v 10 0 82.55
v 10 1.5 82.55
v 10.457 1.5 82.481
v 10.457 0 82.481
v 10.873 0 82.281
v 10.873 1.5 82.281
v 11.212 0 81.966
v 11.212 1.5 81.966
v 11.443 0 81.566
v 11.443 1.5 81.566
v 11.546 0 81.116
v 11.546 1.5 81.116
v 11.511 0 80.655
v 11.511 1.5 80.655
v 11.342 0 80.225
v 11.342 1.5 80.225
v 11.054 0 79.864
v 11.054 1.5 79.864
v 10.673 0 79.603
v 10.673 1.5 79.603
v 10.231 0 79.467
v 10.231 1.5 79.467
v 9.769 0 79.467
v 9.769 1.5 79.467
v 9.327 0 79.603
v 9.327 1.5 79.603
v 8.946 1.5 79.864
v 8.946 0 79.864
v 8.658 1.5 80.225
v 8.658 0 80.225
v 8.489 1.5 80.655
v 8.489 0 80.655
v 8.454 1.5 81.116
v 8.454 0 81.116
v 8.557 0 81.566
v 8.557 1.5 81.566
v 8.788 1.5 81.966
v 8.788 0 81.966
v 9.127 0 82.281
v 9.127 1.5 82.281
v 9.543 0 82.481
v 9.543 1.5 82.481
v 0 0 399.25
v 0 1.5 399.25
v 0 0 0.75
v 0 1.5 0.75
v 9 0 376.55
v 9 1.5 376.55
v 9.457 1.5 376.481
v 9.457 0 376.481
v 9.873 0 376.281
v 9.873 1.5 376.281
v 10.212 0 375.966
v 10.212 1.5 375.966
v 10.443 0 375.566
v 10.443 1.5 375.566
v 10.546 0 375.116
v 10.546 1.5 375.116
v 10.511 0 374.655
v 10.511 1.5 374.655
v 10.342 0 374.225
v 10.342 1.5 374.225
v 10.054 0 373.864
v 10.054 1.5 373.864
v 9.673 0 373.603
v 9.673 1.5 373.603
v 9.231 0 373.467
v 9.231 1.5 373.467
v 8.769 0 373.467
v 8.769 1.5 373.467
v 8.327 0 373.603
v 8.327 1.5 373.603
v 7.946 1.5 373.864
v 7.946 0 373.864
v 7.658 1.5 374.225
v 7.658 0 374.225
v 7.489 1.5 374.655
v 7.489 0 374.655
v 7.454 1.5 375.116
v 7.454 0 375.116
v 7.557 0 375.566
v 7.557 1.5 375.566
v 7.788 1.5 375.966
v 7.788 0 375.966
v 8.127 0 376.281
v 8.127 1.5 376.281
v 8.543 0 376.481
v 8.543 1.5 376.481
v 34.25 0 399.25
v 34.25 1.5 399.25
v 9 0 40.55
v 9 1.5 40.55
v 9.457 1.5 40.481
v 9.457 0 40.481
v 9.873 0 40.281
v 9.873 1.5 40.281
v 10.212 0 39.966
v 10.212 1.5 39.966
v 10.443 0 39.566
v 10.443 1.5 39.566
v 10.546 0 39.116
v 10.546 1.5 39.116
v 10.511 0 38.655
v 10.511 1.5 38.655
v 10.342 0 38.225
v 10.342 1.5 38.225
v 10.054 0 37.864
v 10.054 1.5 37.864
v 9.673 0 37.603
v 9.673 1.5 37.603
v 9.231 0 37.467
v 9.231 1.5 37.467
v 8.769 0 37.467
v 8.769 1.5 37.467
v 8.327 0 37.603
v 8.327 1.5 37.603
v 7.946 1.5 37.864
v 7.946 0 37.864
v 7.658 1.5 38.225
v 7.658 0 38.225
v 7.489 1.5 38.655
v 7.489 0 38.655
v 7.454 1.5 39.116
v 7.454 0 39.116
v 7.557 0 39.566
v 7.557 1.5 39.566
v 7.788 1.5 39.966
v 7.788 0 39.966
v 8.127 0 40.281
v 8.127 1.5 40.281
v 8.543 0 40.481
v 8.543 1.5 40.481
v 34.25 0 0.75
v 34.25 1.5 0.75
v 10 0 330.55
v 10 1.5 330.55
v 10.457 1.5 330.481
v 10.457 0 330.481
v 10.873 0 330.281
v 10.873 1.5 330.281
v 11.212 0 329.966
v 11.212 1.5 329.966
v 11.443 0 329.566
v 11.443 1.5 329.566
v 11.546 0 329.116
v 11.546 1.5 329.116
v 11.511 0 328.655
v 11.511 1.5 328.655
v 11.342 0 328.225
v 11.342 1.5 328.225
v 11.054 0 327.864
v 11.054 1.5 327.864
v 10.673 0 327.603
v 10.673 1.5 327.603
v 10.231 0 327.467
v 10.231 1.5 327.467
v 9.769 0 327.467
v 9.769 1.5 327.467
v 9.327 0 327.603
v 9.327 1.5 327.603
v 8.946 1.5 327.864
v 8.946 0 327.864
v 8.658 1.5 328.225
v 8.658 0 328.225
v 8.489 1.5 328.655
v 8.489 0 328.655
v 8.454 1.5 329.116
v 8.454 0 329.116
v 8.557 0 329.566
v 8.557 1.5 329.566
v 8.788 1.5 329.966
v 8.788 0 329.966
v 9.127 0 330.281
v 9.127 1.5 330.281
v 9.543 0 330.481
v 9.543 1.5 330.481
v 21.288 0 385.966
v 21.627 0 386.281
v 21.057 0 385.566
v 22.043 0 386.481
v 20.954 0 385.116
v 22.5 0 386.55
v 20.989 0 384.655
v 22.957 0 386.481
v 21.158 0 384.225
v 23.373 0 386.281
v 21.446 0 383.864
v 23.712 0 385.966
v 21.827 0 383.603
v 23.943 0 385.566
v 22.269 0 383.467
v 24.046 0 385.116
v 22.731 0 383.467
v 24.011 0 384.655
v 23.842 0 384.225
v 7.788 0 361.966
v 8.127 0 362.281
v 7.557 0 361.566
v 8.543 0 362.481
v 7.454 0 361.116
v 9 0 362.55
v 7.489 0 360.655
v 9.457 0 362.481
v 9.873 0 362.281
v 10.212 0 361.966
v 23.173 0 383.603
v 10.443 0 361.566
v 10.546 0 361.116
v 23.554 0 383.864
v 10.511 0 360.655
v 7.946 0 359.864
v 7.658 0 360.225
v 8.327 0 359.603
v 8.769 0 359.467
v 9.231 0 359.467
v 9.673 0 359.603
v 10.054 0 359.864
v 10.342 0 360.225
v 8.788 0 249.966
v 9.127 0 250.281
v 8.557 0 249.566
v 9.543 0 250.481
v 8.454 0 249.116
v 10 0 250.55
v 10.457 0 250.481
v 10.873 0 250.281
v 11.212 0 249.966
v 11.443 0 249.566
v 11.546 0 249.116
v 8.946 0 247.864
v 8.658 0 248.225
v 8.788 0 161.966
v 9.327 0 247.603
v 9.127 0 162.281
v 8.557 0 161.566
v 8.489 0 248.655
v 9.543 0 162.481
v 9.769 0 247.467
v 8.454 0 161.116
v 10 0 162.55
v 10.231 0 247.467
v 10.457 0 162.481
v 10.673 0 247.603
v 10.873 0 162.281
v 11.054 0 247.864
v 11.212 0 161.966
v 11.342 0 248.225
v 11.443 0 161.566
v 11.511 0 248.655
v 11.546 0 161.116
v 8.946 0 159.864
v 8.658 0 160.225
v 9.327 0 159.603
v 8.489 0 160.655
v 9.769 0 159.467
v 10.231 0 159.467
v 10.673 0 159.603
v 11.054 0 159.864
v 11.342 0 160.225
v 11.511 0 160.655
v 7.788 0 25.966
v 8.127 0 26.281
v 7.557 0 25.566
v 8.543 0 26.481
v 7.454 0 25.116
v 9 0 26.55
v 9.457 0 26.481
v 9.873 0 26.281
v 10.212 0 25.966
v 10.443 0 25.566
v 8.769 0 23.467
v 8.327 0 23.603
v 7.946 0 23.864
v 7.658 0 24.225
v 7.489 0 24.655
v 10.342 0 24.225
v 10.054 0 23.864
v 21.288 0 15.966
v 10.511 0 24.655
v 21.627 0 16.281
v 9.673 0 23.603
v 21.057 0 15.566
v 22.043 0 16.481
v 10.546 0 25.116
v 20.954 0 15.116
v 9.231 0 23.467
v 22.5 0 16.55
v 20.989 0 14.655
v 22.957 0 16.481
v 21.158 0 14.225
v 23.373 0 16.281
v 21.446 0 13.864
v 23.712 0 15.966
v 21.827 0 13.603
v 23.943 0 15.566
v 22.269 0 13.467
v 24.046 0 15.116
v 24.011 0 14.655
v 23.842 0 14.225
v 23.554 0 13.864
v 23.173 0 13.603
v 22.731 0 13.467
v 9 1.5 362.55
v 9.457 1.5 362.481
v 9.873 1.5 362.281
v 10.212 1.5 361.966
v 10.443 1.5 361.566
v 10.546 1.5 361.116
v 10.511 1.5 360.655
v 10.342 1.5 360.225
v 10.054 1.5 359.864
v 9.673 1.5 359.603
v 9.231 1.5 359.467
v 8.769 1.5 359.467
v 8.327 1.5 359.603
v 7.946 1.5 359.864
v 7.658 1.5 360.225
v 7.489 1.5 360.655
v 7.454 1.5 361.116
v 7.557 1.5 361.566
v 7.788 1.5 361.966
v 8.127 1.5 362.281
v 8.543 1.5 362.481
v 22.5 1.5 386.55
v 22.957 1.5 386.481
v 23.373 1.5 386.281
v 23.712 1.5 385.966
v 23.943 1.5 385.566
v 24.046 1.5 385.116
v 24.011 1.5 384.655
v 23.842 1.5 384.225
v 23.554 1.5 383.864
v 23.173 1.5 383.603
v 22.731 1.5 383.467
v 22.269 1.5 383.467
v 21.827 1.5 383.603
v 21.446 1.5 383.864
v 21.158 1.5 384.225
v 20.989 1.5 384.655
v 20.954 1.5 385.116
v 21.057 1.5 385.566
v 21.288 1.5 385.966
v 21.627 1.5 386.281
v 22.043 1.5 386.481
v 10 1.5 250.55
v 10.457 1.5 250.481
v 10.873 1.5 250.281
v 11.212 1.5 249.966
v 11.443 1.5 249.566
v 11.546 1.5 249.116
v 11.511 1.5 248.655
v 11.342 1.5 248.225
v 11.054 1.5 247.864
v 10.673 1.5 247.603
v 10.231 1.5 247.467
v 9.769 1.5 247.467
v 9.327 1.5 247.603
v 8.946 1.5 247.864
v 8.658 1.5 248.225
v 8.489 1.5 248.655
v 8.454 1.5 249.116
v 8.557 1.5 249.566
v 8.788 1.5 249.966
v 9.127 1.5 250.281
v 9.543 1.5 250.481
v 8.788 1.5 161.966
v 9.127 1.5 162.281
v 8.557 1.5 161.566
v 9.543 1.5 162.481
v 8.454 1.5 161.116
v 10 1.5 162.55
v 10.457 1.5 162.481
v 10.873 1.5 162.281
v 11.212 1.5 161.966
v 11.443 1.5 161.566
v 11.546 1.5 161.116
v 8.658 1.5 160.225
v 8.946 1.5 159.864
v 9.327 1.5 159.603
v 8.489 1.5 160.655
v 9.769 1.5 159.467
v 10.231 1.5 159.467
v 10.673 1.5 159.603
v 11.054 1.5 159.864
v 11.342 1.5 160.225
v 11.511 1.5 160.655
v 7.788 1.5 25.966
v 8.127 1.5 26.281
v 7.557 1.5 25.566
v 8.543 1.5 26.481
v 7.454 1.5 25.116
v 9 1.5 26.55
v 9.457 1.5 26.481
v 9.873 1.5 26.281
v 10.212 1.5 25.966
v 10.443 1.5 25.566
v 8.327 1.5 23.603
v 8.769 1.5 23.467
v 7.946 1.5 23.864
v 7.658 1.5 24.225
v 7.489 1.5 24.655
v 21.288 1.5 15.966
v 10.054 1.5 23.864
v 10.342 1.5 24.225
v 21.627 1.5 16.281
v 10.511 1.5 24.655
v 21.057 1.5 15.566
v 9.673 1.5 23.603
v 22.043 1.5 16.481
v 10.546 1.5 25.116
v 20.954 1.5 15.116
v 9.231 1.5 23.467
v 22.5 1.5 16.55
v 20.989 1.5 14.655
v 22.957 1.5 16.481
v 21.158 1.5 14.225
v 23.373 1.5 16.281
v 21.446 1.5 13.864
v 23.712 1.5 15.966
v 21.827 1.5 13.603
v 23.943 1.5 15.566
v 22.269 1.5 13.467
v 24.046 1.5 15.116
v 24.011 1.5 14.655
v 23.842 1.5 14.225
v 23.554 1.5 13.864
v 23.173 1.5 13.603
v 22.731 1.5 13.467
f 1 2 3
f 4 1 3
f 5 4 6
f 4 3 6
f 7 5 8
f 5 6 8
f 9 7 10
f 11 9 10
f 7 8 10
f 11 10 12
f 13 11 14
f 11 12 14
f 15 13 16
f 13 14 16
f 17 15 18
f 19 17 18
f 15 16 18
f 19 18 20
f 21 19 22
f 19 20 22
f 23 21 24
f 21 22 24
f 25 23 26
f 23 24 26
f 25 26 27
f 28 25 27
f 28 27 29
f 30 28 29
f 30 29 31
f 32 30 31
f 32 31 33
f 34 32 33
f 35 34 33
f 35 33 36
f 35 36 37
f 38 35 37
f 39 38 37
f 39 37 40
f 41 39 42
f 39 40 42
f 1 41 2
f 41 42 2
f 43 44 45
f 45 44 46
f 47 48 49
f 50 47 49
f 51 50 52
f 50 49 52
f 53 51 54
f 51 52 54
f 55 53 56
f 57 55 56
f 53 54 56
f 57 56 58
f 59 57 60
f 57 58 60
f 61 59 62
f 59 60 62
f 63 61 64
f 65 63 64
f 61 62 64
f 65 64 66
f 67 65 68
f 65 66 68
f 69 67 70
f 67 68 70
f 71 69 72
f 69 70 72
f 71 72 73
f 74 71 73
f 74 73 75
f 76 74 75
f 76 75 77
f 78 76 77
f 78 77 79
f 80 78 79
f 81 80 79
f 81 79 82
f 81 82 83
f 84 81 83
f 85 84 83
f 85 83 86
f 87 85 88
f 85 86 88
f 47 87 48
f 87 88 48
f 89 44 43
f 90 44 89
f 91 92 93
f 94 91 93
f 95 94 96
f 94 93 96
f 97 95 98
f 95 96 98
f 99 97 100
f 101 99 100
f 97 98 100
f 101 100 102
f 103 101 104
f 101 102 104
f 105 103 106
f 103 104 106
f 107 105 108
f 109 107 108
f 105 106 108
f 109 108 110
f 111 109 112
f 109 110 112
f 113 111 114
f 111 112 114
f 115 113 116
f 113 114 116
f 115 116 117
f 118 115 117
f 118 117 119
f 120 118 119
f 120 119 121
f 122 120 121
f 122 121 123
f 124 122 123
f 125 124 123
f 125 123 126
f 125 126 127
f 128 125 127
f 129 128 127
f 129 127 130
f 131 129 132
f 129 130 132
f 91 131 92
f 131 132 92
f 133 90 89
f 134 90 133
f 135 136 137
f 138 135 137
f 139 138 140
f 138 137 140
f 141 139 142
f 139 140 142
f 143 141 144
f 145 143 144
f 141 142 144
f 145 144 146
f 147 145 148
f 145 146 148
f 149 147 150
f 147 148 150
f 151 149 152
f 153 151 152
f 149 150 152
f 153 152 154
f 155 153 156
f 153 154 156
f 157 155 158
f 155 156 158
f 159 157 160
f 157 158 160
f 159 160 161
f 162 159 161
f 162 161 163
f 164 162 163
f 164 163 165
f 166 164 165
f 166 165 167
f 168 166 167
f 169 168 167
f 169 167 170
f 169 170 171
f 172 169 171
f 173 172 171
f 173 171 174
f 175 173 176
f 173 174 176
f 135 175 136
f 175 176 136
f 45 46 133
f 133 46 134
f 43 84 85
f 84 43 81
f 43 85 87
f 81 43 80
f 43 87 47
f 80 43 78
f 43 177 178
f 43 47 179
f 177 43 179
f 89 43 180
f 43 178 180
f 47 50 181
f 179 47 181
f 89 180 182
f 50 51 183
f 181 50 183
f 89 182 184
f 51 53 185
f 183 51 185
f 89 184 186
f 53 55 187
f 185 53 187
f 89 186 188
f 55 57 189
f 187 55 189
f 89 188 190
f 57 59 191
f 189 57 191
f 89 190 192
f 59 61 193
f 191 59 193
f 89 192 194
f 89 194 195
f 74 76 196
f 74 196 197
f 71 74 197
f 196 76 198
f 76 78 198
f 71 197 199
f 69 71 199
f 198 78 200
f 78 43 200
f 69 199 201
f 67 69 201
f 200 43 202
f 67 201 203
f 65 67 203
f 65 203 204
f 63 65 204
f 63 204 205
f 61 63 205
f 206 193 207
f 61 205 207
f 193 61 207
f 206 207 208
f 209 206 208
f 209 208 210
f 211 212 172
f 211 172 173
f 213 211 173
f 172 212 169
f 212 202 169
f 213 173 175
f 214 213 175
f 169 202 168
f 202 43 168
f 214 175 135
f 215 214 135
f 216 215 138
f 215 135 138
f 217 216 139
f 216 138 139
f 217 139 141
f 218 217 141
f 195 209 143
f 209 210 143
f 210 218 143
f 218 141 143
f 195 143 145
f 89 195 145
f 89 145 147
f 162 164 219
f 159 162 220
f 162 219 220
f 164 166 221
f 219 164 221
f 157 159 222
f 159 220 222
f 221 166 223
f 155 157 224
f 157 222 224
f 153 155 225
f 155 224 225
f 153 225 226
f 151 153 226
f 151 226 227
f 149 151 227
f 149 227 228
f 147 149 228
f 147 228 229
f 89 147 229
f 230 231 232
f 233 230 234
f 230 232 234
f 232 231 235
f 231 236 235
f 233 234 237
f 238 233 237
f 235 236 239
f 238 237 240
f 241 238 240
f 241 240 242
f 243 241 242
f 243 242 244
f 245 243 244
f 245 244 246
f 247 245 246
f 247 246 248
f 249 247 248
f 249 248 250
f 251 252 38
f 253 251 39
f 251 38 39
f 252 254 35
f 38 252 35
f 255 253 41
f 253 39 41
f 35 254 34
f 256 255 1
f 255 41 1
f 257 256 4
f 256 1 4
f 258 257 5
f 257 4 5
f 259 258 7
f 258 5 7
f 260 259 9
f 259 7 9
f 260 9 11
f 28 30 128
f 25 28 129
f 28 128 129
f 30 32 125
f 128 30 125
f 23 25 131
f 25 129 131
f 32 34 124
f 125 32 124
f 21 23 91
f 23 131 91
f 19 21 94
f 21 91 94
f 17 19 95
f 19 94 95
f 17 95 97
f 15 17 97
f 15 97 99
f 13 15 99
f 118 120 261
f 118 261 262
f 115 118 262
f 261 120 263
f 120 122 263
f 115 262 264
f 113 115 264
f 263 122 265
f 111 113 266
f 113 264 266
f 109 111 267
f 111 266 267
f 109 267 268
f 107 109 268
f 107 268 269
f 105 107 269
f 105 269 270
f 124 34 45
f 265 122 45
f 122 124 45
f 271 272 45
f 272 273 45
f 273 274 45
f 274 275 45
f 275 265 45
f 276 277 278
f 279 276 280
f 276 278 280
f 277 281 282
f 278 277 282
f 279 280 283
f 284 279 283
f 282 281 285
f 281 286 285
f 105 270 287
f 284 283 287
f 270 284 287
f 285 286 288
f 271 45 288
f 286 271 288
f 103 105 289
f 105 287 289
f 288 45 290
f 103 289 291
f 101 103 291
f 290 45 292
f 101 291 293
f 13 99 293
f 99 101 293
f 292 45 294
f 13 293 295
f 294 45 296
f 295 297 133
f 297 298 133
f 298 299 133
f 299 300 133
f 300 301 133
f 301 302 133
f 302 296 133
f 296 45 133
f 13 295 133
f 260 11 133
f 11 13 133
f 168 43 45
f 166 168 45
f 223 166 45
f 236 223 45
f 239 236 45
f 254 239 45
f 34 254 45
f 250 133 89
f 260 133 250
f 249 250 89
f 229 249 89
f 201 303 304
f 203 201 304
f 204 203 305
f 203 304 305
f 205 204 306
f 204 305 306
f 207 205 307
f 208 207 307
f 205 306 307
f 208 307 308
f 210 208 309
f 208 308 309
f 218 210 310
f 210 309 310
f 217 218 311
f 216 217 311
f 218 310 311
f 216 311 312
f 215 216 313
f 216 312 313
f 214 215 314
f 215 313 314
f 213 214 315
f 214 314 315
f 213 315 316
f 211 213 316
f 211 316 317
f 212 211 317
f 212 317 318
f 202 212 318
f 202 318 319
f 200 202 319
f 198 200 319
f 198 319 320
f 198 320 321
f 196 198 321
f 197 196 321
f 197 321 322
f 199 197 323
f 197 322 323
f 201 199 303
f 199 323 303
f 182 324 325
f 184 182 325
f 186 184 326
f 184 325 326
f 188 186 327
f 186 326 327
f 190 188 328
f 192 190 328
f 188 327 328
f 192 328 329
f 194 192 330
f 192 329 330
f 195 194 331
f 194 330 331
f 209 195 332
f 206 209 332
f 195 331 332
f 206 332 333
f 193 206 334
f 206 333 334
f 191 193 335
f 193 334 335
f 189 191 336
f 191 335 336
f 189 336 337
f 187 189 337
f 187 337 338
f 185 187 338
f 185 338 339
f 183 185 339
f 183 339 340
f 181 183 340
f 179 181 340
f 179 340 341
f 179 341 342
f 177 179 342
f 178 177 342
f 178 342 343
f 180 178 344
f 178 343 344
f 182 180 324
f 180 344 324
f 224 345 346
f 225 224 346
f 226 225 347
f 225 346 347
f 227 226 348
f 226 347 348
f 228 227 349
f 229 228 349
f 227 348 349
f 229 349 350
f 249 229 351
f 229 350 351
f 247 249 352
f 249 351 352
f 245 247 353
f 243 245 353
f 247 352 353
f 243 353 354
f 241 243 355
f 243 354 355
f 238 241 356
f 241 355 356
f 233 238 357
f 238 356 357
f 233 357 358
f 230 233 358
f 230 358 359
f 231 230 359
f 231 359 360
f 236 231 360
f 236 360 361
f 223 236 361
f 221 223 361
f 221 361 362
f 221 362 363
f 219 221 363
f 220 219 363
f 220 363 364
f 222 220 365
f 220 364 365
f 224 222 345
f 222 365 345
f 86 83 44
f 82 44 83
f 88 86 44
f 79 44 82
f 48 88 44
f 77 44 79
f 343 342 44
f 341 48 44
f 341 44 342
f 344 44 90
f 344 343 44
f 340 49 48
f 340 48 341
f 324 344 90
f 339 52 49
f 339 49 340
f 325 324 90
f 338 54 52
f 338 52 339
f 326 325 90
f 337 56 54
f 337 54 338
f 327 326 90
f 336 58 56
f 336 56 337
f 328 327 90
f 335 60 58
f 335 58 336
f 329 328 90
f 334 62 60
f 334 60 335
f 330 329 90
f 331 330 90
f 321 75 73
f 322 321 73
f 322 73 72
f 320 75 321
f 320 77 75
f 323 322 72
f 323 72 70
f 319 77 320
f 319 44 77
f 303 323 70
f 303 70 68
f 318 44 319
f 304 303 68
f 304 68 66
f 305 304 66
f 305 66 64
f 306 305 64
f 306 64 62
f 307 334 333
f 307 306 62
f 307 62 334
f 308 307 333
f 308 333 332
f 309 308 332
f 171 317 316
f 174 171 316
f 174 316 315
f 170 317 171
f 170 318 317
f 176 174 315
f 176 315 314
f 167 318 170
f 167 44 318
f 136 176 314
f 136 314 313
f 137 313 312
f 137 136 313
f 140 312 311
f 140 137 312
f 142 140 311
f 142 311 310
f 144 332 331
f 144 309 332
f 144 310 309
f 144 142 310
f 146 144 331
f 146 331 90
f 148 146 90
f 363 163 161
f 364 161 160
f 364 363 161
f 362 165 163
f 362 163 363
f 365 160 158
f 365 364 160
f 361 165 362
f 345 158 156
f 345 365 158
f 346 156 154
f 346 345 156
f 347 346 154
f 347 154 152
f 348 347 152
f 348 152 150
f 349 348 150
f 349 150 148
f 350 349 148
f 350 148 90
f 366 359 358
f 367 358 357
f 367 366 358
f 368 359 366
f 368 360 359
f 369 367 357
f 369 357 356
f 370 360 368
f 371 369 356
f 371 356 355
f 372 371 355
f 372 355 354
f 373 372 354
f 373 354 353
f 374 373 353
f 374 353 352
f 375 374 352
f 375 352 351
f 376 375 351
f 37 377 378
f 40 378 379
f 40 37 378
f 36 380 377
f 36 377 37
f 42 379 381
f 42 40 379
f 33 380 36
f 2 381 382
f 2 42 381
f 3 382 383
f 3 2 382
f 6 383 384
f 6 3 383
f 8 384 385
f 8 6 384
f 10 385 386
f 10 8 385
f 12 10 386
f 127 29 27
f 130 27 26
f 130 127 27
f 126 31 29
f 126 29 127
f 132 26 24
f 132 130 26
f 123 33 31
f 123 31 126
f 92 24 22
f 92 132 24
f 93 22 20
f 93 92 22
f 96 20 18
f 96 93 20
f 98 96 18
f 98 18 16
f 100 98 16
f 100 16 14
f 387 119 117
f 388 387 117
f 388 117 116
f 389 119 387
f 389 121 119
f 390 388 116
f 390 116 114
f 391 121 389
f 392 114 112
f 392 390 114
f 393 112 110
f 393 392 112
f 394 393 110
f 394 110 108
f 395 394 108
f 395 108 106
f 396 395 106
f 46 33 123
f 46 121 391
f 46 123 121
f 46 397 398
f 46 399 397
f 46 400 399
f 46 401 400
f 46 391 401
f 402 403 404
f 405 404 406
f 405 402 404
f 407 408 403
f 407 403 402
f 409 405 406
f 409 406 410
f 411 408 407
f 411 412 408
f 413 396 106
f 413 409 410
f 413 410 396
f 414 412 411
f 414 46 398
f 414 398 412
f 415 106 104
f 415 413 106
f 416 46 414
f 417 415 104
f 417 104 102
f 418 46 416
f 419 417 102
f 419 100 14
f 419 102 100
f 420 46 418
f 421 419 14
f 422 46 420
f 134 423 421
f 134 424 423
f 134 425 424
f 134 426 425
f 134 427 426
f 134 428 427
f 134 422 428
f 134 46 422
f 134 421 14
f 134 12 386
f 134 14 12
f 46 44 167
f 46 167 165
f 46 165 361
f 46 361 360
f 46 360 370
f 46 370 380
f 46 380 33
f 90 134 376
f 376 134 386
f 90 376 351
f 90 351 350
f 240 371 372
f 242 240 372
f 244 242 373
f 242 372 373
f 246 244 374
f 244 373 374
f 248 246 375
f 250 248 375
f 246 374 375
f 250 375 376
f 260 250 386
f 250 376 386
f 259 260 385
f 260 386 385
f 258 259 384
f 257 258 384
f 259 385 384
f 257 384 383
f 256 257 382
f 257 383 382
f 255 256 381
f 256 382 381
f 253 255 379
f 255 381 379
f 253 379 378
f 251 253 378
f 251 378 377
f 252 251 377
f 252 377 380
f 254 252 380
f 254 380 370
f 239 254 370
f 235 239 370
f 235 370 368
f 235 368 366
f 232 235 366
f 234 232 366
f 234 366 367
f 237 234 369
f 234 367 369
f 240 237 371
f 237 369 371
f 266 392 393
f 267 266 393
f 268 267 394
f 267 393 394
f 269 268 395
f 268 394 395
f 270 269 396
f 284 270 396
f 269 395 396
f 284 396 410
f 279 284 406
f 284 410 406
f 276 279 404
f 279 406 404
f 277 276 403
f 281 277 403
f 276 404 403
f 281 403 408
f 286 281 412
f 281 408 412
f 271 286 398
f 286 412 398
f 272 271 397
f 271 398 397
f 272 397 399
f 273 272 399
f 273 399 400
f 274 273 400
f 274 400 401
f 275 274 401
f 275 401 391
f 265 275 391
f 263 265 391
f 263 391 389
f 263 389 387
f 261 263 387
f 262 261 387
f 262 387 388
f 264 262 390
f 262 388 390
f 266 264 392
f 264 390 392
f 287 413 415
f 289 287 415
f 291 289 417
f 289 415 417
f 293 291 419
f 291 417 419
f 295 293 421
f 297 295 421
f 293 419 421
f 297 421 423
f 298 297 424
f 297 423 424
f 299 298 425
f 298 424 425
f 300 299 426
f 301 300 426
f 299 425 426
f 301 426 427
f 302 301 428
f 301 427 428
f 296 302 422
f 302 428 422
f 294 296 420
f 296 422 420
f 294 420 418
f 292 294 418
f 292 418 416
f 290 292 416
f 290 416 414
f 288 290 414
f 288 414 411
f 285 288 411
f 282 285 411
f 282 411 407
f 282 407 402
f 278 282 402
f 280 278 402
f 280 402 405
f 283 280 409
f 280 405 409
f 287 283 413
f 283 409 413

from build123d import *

# Parameters (mm, degrees)
CROQUIS1_W              = 35
CROQUIS1_H              = 400
SALIENTE_EXTRUIR1_DEPTH = 1.5
CROQUIS2_R              = 1.55
CORTAR_EXTRUIR1_DEPTH   = 1.5
CROQUIS3_R              = 1.55
CORTAR_EXTRUIR2_DEPTH   = 1.5
CROQUIS5_R              = 1.55
CORTAR_EXTRUIR3_DEPTH   = 1.5
CROQUIS6_OUTSIDE_W      = 117.306
CROQUIS6_OUTSIDE_H      = 482.306
CROQUIS6_OUTSIDE_W_2    = 33.5
CROQUIS6_OUTSIDE_H_2    = 398.5
CORTAR_EXTRUIR4_DEPTH   = 1.5
CROQUIS7_W              = 0.75
CROQUIS7_H              = 398.5
SALIENTE_EXTRUIR2_DEPTH = 1.5


with BuildPart() as part:
    # Croquis1 → Saliente-Extruir1 (new body)
    with BuildSketch(Plane(origin=(0, 0, 0), x_dir=(1, 0, 0), z_dir=(0, 1, 0))):
        with Locations((17.5, -200)):
            Rectangle(CROQUIS1_W, CROQUIS1_H)
    extrude(amount=SALIENTE_EXTRUIR1_DEPTH)

    # Croquis2 → Cortar-Extruir1 (cut)
    with BuildSketch(Plane(origin=(0, 1.5, 0), x_dir=(1, 0, 0), z_dir=(0, 1, 0))):
        with Locations(Location((22.5, -15, 0), (0, 0, 270))):
            Circle(CROQUIS2_R)
        with Locations(Location((22.5, -385, 0), (0, 0, 270))):
            Circle(CROQUIS2_R)
    extrude(amount=-CORTAR_EXTRUIR1_DEPTH, mode=Mode.SUBTRACT)

    # Croquis3 → Cortar-Extruir2 (cut)
    with BuildSketch(Plane(origin=(0, 1.5, 0), x_dir=(1, 0, 0), z_dir=(0, 1, 0))):
        with Locations(Location((9, -25, 0), (0, 0, 270))):
            Circle(CROQUIS3_R)
        with Locations(Location((9, -39, 0), (0, 0, 270))):
            Circle(CROQUIS3_R)
        with Locations(Location((9, -375, 0), (0, 0, 270))):
            Circle(CROQUIS3_R)
        with Locations(Location((9, -361, 0), (0, 0, 270))):
            Circle(CROQUIS3_R)
    extrude(amount=-CORTAR_EXTRUIR2_DEPTH, mode=Mode.SUBTRACT)

    # Croquis5 → Cortar-Extruir3 (cut)
    with BuildSketch(Plane(origin=(0, 1.5, 0), x_dir=(1, 0, 0), z_dir=(0, 1, 0))):
        with Locations(Location((10, -81, 0), (0, 0, 270))):
            Circle(CROQUIS5_R)
        with Locations(Location((10, -161, 0), (0, 0, 270))):
            Circle(CROQUIS5_R)
        with Locations(Location((10, -249, 0), (0, 0, 270))):
            Circle(CROQUIS5_R)
        with Locations(Location((10, -329, 0), (0, 0, 270))):
            Circle(CROQUIS5_R)
    extrude(amount=-CORTAR_EXTRUIR3_DEPTH, mode=Mode.SUBTRACT)

    # Croquis6 outside → Cortar-Extruir4 (cut)
    with BuildSketch(Plane(origin=(0, 1.5, 0), x_dir=(1, 0, 0), z_dir=(0, 1, 0))):
        with Locations((17.5, -200)):
            Rectangle(CROQUIS6_OUTSIDE_W, CROQUIS6_OUTSIDE_H)
        with Locations((17.5, -200)):
            Rectangle(CROQUIS6_OUTSIDE_W_2, CROQUIS6_OUTSIDE_H_2, mode=Mode.SUBTRACT)
    extrude(amount=-CORTAR_EXTRUIR4_DEPTH, mode=Mode.SUBTRACT)

    # Croquis7 → Saliente-Extruir2 (add)
    with BuildSketch(Plane(origin=(0, 1.5, 0), x_dir=(1, 0, 0), z_dir=(0, 1, 0))):
        with Locations((0.375, -200)):
            Rectangle(CROQUIS7_W, CROQUIS7_H)
    extrude(amount=-SALIENTE_EXTRUIR2_DEPTH)


solid = part.part
